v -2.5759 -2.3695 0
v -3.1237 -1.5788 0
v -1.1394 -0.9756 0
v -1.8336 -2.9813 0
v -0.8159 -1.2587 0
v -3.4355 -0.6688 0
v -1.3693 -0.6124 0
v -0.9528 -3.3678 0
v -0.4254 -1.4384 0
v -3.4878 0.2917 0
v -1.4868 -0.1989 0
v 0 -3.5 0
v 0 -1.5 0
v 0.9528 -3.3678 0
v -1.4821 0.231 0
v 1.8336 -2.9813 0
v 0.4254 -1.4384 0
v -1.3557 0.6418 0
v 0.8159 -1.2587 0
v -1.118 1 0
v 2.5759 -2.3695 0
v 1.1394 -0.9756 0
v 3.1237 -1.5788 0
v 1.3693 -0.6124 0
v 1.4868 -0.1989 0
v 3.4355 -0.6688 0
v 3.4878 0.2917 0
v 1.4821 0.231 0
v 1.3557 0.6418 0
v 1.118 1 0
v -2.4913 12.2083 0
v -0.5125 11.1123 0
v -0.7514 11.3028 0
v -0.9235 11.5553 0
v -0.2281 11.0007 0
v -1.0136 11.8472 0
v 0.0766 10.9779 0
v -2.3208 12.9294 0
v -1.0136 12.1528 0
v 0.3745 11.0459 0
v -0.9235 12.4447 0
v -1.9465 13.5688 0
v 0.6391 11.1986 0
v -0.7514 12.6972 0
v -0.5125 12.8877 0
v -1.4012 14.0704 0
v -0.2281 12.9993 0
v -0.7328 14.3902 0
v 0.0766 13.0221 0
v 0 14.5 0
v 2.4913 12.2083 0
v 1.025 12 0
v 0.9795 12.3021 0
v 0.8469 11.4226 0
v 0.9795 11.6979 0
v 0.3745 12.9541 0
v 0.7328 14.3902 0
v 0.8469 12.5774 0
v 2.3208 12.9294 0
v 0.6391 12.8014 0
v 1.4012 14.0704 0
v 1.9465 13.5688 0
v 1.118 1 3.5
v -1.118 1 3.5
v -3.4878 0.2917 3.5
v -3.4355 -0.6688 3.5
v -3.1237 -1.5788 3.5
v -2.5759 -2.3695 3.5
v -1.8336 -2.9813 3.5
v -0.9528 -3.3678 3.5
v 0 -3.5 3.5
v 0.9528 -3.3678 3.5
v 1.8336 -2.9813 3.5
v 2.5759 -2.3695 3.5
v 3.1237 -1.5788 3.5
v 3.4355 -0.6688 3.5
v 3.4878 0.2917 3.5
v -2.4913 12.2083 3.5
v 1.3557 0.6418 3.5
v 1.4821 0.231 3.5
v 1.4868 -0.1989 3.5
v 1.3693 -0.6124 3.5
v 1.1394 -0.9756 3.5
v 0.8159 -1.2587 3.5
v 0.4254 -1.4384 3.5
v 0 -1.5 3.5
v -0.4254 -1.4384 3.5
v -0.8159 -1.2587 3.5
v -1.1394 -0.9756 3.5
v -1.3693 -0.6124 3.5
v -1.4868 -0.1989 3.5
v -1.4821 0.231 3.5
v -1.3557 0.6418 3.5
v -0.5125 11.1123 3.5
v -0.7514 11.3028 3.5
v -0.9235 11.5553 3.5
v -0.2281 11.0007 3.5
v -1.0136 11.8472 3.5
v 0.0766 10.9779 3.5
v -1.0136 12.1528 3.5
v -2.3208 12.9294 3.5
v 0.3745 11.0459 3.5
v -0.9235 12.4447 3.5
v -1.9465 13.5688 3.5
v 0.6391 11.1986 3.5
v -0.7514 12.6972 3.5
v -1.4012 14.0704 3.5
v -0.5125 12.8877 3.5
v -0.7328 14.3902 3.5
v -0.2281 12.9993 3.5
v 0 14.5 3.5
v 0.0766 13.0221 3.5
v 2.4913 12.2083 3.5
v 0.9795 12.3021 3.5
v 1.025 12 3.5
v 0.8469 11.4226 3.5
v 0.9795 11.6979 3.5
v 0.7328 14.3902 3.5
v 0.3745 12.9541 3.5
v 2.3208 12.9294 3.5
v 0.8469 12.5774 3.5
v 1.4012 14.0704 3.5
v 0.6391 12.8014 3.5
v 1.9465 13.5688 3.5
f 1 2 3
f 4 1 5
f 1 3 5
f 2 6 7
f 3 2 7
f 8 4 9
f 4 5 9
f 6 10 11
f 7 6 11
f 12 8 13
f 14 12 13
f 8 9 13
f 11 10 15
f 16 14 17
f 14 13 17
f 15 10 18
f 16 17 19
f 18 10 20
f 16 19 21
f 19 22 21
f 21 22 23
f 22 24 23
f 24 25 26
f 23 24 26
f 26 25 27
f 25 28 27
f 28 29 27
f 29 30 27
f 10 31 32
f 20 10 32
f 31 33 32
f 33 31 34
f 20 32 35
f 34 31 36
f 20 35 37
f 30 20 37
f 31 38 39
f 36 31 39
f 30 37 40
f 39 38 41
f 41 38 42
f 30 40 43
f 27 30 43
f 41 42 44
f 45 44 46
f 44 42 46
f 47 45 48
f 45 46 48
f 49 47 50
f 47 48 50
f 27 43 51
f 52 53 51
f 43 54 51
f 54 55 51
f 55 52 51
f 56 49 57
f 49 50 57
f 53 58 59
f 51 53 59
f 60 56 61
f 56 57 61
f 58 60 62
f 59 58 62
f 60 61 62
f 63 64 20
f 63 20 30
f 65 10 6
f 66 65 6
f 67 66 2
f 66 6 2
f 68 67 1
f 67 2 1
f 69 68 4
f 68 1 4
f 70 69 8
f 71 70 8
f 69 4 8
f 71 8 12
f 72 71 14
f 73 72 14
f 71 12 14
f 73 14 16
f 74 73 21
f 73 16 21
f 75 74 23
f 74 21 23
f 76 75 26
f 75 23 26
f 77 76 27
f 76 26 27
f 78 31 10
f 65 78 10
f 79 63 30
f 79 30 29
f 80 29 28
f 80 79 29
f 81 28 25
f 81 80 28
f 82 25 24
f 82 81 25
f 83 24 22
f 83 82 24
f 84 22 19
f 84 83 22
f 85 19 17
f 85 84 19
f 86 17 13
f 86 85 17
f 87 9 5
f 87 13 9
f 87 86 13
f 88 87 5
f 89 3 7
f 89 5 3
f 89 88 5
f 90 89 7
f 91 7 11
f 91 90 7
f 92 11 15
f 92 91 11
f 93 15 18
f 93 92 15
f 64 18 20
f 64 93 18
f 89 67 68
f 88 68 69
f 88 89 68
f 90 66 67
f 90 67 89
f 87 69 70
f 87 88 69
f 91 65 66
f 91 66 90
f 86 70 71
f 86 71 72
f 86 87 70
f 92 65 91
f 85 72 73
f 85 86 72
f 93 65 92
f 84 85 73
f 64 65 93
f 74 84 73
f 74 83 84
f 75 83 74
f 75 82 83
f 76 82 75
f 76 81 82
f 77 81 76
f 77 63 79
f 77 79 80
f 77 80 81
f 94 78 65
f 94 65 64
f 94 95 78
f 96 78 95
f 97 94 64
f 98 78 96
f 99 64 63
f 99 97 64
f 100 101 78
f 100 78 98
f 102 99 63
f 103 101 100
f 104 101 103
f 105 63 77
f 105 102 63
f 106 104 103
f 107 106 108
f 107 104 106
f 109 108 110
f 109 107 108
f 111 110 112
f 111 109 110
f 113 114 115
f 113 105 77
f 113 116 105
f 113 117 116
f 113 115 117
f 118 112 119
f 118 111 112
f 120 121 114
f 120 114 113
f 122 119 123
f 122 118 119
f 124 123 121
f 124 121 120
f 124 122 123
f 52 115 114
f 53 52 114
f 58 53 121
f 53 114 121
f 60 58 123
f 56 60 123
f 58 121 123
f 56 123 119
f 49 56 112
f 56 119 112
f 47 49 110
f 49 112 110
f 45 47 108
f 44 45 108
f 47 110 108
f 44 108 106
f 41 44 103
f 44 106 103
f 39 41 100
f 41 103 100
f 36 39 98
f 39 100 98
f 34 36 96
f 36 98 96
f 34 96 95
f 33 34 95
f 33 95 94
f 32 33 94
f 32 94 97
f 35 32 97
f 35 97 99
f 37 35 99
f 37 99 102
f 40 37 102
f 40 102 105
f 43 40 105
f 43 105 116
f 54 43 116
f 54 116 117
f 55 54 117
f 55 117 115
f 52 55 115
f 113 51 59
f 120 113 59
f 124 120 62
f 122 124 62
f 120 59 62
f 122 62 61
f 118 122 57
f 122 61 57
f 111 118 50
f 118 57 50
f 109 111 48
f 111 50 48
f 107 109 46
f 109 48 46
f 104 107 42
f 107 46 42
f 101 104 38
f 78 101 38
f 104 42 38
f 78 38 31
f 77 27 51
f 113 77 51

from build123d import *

# Parameters (mm, degrees)
BOSS_EXTRUDE1_DEPTH = 3.5
SKETCH2_R           = 1.025
CUT_EXTRUDE1_DEPTH  = 16.321553446


with BuildPart() as part:
    # Sketch1 → Boss-Extrude1 (new body)
    with BuildSketch(Plane.XY):
        with BuildLine():
            Line((-2.491304321, 12.208333333), (-3.48782605, 0.291666667))
            ThreePointArc((-3.48782605, 0.291666667), (0, -3.5), (3.48782605, 0.291666667))
            Line((3.48782605, 0.291666667), (2.491304321, 12.208333333))
            ThreePointArc((2.491304321, 12.208333333), (0, 14.5), (-2.491304321, 12.208333333))
        make_face()
    extrude(amount=BOSS_EXTRUDE1_DEPTH)

    # Sketch2 → Cut-Extrude1 (cut, through all)
    with BuildSketch(Plane.XY.offset(3.5)):
        with Locations((0, 12)):
            Circle(SKETCH2_R)
        with BuildLine():
            Line((-1.118033989, 1), (1.118033989, 1))
            ThreePointArc((1.118033989, 1), (0, -1.5), (-1.118033989, 1))
        make_face()
    extrude(amount=-CUT_EXTRUDE1_DEPTH, mode=Mode.SUBTRACT)


solid = part.part
